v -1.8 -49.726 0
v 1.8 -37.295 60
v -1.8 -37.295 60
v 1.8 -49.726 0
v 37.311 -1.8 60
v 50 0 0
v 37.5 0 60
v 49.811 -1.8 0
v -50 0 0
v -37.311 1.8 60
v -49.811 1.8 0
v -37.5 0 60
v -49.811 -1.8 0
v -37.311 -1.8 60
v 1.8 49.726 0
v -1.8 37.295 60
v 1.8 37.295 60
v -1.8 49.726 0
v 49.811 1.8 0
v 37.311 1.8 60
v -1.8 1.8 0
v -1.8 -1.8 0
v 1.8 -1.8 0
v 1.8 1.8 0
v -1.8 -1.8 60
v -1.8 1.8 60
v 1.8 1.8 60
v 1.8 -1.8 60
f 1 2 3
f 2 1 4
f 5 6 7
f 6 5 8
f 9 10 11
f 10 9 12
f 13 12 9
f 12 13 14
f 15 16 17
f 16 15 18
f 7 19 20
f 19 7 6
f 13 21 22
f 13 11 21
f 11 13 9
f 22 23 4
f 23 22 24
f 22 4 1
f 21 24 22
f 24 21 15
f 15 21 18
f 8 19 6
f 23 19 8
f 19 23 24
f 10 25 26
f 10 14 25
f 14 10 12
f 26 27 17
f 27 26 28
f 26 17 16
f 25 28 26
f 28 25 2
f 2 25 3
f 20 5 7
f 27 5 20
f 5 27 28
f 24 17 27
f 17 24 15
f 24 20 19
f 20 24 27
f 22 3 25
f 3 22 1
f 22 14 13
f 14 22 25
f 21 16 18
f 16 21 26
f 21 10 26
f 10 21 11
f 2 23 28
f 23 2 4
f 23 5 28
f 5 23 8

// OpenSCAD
r1= 100 / 2.0; // base radius
r2= 75 / 2.0;  // top radius
h = 60;   // height
m = 1.8;  // margin
d = 100; // difference dim

fn = 128;


module render() {
  difference() {
    cylinder(h=h, r1=r1, r2=r2, center=false);
    translate([m, m, 0])
    cube([d, d, d],false);
    translate([-d-m, -d-m, 0])
    cube([d, d, d],false);
    translate([-d-m, m, 0])
    cube([d, d, d],false);
    translate([m, -d-m, 0])
    cube([d, d, d],false);
  }
}

echo(version=version());

render();
